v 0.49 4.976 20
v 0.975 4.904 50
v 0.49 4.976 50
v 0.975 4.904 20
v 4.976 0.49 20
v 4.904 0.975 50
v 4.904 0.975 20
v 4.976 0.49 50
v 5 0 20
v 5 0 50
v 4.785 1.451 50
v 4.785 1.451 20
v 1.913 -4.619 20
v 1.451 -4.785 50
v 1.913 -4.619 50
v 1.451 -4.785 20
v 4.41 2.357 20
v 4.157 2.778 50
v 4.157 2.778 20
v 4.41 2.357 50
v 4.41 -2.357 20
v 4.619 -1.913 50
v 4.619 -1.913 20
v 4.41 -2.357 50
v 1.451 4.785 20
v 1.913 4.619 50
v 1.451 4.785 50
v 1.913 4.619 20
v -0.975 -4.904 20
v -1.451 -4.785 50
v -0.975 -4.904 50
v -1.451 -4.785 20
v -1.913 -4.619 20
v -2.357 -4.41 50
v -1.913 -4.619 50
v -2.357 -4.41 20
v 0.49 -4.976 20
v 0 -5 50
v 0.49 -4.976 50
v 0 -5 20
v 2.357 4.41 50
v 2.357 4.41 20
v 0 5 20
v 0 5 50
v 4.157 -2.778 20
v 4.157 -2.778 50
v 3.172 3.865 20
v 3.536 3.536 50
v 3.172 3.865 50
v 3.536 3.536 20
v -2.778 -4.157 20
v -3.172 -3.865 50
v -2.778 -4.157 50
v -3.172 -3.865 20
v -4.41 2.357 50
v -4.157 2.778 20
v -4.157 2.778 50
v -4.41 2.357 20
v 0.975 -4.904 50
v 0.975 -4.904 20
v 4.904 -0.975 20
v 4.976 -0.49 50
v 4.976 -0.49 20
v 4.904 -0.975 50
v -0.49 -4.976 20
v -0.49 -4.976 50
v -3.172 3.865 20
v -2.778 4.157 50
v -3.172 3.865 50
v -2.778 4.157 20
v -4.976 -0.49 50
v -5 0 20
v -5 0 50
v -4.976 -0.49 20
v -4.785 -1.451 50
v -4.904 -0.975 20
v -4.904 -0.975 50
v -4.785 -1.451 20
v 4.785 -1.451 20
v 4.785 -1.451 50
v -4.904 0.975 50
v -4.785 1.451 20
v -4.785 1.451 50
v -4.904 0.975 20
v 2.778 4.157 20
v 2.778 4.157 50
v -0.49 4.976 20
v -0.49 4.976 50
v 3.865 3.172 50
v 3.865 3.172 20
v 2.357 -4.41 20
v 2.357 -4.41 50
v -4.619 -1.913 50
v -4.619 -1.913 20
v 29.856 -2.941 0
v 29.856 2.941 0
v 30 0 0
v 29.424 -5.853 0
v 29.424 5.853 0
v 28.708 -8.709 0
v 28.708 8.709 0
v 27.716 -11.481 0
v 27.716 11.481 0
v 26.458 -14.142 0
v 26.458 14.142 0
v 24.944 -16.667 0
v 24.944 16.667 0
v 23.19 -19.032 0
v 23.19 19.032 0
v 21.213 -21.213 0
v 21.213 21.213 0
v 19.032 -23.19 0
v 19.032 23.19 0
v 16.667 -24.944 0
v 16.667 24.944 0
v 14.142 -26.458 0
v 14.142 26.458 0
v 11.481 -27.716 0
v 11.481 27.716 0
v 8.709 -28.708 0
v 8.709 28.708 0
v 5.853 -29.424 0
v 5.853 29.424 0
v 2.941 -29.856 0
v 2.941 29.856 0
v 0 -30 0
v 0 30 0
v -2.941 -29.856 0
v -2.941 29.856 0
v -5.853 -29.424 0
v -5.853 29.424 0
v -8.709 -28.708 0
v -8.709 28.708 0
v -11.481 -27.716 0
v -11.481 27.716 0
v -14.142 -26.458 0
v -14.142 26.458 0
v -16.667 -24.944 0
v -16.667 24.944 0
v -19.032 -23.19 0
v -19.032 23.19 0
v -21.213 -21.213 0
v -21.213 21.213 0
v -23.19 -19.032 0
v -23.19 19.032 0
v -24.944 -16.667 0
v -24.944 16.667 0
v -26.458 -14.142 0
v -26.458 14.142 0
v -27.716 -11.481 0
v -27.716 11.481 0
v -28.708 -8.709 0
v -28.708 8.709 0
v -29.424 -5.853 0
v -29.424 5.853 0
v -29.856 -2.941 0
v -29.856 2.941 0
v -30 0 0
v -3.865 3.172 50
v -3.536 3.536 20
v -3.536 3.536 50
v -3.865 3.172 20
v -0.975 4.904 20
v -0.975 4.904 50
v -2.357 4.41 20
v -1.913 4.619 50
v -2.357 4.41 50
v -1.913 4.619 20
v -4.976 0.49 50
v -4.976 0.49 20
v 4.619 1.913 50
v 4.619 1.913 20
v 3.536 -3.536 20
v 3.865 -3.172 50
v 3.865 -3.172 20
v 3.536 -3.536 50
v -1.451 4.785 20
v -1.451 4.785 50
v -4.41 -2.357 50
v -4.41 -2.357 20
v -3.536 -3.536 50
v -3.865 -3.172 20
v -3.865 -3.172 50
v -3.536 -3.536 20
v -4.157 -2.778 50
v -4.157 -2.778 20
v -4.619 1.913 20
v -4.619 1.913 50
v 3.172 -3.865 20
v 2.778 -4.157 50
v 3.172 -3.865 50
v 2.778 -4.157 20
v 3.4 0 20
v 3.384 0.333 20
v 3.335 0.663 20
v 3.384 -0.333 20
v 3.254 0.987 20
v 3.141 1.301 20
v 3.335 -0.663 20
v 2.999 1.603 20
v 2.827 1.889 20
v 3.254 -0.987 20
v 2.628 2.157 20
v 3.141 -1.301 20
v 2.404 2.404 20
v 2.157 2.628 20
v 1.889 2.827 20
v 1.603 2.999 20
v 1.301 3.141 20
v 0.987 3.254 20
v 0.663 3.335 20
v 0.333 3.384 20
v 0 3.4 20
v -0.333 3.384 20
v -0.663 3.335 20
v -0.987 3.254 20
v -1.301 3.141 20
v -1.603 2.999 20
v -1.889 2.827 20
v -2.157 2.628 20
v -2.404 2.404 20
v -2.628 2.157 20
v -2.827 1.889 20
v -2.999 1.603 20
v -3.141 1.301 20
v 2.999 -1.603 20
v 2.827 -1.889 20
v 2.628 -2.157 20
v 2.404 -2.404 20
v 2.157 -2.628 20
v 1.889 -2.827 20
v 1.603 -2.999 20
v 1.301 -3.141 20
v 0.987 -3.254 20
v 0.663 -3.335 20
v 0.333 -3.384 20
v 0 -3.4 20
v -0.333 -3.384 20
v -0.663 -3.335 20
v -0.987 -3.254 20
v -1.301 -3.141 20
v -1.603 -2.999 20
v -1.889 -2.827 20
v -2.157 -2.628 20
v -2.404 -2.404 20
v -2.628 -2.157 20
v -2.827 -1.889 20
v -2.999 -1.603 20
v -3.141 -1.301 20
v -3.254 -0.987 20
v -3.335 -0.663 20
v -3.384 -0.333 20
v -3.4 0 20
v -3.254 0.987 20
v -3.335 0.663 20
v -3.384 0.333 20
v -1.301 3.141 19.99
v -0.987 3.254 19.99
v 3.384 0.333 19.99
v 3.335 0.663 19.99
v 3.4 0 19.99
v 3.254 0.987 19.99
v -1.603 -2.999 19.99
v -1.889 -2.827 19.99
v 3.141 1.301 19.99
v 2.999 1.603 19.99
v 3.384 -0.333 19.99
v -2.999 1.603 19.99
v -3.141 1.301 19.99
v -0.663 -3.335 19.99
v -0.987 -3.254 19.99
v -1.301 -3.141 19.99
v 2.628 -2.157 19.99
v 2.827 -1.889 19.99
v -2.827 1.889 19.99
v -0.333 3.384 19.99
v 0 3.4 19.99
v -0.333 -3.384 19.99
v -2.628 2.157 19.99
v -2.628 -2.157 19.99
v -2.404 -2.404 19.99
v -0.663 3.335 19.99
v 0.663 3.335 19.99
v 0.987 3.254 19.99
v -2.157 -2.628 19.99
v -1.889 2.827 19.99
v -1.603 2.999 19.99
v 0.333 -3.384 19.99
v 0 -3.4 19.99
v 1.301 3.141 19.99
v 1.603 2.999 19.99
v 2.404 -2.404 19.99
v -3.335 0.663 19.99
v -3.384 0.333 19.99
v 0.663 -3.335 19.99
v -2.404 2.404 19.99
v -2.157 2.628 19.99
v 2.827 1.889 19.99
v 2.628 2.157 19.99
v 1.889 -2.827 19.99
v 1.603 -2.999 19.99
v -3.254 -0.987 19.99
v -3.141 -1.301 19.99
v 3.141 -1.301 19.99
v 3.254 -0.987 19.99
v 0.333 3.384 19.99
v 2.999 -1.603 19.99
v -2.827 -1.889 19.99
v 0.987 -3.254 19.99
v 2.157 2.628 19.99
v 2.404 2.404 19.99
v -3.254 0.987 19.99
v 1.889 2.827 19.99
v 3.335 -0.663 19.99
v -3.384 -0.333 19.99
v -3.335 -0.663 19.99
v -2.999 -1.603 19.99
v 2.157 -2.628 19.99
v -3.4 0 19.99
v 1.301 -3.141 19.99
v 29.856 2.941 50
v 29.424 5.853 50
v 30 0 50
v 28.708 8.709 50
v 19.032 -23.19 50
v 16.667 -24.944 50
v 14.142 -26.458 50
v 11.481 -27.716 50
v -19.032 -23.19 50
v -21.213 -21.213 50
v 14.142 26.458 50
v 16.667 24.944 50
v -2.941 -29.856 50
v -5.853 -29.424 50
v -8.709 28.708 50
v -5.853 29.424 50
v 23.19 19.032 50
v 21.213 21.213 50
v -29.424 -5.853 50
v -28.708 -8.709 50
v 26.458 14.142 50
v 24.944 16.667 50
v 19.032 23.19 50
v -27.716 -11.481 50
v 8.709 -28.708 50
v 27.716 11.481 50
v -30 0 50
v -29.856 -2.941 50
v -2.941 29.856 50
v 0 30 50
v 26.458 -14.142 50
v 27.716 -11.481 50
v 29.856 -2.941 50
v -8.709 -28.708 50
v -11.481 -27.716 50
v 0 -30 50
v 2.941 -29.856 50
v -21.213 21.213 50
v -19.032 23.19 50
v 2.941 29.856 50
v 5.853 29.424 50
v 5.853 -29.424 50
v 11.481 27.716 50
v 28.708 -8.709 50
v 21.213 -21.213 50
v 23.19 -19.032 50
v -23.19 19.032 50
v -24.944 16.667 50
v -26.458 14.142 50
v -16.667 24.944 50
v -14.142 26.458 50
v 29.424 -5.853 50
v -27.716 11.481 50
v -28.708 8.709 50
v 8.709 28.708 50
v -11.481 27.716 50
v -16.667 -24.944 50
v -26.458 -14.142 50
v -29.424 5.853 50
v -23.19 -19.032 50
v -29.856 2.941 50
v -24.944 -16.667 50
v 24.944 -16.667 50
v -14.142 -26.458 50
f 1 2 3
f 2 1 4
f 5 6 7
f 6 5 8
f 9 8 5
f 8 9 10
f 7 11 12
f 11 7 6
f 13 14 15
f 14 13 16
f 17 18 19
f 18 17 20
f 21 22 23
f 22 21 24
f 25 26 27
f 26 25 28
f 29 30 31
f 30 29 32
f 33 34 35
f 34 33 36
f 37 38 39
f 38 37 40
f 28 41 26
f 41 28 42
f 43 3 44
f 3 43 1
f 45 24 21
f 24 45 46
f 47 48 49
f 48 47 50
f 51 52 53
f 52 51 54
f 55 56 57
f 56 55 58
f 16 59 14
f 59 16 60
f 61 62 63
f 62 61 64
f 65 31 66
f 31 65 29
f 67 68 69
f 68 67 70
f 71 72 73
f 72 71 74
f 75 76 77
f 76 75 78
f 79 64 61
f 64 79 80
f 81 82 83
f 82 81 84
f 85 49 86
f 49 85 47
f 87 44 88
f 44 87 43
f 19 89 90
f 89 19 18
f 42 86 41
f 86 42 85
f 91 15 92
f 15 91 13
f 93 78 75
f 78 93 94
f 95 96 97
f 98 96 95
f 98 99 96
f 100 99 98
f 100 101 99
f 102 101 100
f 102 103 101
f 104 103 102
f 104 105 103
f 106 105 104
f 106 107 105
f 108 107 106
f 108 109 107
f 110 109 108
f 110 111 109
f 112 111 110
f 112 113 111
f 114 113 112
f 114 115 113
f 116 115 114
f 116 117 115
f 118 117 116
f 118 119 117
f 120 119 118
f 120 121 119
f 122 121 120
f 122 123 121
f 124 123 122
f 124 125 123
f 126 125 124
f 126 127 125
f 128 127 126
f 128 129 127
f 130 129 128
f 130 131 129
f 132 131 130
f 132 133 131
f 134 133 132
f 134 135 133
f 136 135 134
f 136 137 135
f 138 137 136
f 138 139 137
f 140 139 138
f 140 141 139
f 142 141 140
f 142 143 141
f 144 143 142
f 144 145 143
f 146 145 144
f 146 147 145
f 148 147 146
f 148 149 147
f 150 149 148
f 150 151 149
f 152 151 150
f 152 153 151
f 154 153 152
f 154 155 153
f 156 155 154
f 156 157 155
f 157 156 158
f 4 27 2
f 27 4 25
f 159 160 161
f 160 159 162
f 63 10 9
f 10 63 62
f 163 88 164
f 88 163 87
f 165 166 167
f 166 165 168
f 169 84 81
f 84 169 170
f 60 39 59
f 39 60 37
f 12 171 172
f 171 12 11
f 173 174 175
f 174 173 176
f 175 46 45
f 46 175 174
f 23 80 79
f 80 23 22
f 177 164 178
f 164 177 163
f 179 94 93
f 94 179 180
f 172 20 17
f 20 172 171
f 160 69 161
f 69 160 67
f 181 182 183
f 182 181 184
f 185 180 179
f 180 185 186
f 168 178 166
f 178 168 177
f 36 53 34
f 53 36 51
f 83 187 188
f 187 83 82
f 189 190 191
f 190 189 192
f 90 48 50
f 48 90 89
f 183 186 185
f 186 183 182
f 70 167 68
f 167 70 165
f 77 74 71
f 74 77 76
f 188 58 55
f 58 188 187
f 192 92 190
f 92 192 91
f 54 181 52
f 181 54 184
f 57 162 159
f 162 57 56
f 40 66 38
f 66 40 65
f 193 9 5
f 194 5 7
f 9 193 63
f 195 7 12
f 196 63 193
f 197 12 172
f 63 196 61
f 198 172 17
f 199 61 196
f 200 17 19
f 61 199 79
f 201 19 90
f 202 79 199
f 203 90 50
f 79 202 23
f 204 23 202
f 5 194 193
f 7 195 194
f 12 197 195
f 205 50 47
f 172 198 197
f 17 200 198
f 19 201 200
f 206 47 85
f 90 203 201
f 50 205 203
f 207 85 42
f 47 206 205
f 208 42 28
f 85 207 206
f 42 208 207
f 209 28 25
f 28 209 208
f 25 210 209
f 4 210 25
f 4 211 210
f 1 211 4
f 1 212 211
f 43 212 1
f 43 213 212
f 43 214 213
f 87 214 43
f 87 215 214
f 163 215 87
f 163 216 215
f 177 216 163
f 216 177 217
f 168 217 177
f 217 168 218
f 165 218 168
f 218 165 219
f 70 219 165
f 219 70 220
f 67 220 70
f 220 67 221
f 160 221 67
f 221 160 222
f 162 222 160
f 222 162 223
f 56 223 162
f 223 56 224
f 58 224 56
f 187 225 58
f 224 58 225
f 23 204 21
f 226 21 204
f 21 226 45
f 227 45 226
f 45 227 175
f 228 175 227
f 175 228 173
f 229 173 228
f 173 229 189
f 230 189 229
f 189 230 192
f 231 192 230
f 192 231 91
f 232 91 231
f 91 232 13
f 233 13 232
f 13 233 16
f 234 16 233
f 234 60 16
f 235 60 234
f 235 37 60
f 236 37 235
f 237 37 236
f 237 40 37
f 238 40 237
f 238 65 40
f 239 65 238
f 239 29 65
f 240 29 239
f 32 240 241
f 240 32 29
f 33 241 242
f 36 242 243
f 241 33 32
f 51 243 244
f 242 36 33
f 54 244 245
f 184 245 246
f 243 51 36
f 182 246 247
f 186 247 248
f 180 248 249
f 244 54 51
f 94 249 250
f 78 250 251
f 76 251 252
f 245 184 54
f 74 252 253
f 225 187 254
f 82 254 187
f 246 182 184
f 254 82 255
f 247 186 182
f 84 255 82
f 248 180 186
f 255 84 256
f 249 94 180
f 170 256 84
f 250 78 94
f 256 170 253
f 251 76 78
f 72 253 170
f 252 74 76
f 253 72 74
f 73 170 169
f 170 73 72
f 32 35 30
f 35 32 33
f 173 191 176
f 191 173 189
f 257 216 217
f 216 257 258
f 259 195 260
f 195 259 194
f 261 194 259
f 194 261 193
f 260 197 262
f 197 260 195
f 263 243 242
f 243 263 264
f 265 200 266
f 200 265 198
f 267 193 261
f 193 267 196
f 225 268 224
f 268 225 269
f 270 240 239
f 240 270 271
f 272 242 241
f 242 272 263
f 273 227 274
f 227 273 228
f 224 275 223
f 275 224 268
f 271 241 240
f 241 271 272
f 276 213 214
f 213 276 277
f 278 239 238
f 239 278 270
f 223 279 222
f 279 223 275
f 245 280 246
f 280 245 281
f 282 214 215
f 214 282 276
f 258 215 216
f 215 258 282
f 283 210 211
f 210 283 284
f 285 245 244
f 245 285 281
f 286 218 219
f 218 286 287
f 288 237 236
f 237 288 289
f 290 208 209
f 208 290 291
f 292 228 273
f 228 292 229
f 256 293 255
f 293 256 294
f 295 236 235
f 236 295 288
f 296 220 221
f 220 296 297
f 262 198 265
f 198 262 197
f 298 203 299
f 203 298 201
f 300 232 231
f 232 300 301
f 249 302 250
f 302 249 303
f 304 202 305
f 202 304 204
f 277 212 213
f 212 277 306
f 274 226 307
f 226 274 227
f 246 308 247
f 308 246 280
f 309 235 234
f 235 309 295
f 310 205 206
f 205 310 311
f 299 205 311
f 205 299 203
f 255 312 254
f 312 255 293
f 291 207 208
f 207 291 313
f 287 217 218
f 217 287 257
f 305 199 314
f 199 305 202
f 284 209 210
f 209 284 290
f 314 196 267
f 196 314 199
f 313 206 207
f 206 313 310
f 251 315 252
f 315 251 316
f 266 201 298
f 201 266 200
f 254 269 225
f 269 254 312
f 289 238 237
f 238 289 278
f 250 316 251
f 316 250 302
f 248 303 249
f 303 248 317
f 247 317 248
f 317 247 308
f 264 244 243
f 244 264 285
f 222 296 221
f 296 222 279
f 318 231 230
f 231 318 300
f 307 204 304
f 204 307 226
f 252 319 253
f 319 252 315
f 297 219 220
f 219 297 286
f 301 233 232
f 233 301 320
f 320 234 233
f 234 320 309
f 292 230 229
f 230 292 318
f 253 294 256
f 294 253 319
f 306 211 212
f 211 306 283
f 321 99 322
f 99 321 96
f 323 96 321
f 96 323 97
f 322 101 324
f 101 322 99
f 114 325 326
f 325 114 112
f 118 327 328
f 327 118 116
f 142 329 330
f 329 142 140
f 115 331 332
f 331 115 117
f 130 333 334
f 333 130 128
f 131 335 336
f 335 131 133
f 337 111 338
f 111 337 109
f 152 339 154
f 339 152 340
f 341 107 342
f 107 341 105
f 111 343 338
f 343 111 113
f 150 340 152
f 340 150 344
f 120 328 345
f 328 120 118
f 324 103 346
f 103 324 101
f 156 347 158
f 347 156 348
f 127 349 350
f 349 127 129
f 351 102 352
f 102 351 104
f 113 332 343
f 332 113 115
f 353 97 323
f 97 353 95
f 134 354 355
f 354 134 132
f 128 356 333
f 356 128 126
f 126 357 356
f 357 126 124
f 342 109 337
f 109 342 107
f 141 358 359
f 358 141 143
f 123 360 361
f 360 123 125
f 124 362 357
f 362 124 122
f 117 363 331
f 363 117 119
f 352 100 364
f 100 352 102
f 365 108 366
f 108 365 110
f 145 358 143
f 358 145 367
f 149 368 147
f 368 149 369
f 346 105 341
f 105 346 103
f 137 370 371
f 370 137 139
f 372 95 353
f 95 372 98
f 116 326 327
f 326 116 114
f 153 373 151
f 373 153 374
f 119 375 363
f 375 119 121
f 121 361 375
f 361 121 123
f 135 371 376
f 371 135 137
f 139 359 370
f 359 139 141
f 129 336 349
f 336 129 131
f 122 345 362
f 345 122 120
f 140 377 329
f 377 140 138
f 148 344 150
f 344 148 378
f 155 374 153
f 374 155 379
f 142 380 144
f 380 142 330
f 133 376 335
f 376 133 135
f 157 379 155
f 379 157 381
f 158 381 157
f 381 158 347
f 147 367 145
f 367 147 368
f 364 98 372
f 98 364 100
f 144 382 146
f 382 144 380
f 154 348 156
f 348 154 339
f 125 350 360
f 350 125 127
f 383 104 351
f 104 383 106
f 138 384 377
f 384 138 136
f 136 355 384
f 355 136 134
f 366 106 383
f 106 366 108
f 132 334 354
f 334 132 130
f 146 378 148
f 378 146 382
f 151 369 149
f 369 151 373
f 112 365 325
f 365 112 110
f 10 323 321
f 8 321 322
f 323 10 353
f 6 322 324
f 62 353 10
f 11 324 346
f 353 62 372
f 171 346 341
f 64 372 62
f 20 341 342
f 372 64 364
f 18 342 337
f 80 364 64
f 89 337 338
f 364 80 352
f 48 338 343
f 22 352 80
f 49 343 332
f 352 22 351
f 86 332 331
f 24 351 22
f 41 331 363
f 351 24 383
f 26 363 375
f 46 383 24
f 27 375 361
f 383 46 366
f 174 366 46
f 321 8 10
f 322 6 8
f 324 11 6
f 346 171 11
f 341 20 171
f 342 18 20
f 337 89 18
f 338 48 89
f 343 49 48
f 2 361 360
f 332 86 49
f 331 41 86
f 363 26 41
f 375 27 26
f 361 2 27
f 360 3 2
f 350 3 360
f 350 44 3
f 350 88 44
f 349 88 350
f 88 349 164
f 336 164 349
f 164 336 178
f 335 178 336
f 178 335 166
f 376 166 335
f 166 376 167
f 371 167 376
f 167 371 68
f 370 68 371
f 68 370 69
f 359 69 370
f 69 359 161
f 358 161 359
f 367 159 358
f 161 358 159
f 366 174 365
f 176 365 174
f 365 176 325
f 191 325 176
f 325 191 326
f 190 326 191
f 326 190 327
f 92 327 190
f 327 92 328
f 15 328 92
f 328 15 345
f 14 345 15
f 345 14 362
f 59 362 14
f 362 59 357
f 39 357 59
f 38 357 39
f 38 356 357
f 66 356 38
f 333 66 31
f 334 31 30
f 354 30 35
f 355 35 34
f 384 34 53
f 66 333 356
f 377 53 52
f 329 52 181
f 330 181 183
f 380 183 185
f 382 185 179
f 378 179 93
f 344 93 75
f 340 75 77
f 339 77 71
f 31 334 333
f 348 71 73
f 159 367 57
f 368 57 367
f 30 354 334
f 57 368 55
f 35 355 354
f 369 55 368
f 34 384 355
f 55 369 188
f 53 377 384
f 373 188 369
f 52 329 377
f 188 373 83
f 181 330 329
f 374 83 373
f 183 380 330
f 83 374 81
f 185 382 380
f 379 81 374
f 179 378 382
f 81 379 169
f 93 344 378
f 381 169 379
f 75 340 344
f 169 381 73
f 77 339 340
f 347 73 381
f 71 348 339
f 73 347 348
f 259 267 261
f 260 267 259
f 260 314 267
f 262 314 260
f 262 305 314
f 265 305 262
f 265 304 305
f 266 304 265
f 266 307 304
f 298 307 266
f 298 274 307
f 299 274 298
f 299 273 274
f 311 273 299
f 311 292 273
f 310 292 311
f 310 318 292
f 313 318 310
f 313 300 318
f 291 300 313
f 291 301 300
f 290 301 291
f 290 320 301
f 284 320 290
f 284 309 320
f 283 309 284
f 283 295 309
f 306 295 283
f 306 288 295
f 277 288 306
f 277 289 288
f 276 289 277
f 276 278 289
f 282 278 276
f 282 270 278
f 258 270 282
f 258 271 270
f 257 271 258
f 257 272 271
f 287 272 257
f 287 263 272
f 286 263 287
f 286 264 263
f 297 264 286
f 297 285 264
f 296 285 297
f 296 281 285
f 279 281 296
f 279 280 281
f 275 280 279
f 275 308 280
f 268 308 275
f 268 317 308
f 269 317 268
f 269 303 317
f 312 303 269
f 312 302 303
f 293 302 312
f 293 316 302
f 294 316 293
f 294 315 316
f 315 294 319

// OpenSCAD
// Funnel with spout - printed upright, wide opening at top
// Units: mm. Wall thickness 1.6 mm throughout.

$fn = 64;

// ---- Dimensions ----
spout_od      = 10;    // spout outer diameter
spout_id      = spout_od - 2 * 1.6;  // spout bore (6.8 mm)
spout_len     = 20;    // spout length (z = 0 to 20)
cone_top_d    = 60;    // cone rim outer diameter (z = 50)
cone_bottom_d = 10;    // cone base outer diameter (z = 20)
cone_h        = cone_top_d - cone_bottom_d;  // cone height (40 mm)
eps           = 0.5;   // cutter overshoot past faces

// ---- Model ----
union() {
    // Spout: tube from z = 0 to 20
    difference() {
        cylinder(d = spout_od, h = spout_len);
        translate([0, 0, -eps])
            cylinder(d = spout_id, h = spout_len + 2 * eps);
    }

    // Cone: widens from 10 mm (z = 20) to 60 mm (z = 50)
    difference() {
        cylinder(d = cone_top_d, h = cone_h, $fn = 64);
        translate([0, 0, spout_len - 0.01])
            cylinder(d = cone_bottom_d, h = cone_h + 0.01, $fn = 64);
    }
}
